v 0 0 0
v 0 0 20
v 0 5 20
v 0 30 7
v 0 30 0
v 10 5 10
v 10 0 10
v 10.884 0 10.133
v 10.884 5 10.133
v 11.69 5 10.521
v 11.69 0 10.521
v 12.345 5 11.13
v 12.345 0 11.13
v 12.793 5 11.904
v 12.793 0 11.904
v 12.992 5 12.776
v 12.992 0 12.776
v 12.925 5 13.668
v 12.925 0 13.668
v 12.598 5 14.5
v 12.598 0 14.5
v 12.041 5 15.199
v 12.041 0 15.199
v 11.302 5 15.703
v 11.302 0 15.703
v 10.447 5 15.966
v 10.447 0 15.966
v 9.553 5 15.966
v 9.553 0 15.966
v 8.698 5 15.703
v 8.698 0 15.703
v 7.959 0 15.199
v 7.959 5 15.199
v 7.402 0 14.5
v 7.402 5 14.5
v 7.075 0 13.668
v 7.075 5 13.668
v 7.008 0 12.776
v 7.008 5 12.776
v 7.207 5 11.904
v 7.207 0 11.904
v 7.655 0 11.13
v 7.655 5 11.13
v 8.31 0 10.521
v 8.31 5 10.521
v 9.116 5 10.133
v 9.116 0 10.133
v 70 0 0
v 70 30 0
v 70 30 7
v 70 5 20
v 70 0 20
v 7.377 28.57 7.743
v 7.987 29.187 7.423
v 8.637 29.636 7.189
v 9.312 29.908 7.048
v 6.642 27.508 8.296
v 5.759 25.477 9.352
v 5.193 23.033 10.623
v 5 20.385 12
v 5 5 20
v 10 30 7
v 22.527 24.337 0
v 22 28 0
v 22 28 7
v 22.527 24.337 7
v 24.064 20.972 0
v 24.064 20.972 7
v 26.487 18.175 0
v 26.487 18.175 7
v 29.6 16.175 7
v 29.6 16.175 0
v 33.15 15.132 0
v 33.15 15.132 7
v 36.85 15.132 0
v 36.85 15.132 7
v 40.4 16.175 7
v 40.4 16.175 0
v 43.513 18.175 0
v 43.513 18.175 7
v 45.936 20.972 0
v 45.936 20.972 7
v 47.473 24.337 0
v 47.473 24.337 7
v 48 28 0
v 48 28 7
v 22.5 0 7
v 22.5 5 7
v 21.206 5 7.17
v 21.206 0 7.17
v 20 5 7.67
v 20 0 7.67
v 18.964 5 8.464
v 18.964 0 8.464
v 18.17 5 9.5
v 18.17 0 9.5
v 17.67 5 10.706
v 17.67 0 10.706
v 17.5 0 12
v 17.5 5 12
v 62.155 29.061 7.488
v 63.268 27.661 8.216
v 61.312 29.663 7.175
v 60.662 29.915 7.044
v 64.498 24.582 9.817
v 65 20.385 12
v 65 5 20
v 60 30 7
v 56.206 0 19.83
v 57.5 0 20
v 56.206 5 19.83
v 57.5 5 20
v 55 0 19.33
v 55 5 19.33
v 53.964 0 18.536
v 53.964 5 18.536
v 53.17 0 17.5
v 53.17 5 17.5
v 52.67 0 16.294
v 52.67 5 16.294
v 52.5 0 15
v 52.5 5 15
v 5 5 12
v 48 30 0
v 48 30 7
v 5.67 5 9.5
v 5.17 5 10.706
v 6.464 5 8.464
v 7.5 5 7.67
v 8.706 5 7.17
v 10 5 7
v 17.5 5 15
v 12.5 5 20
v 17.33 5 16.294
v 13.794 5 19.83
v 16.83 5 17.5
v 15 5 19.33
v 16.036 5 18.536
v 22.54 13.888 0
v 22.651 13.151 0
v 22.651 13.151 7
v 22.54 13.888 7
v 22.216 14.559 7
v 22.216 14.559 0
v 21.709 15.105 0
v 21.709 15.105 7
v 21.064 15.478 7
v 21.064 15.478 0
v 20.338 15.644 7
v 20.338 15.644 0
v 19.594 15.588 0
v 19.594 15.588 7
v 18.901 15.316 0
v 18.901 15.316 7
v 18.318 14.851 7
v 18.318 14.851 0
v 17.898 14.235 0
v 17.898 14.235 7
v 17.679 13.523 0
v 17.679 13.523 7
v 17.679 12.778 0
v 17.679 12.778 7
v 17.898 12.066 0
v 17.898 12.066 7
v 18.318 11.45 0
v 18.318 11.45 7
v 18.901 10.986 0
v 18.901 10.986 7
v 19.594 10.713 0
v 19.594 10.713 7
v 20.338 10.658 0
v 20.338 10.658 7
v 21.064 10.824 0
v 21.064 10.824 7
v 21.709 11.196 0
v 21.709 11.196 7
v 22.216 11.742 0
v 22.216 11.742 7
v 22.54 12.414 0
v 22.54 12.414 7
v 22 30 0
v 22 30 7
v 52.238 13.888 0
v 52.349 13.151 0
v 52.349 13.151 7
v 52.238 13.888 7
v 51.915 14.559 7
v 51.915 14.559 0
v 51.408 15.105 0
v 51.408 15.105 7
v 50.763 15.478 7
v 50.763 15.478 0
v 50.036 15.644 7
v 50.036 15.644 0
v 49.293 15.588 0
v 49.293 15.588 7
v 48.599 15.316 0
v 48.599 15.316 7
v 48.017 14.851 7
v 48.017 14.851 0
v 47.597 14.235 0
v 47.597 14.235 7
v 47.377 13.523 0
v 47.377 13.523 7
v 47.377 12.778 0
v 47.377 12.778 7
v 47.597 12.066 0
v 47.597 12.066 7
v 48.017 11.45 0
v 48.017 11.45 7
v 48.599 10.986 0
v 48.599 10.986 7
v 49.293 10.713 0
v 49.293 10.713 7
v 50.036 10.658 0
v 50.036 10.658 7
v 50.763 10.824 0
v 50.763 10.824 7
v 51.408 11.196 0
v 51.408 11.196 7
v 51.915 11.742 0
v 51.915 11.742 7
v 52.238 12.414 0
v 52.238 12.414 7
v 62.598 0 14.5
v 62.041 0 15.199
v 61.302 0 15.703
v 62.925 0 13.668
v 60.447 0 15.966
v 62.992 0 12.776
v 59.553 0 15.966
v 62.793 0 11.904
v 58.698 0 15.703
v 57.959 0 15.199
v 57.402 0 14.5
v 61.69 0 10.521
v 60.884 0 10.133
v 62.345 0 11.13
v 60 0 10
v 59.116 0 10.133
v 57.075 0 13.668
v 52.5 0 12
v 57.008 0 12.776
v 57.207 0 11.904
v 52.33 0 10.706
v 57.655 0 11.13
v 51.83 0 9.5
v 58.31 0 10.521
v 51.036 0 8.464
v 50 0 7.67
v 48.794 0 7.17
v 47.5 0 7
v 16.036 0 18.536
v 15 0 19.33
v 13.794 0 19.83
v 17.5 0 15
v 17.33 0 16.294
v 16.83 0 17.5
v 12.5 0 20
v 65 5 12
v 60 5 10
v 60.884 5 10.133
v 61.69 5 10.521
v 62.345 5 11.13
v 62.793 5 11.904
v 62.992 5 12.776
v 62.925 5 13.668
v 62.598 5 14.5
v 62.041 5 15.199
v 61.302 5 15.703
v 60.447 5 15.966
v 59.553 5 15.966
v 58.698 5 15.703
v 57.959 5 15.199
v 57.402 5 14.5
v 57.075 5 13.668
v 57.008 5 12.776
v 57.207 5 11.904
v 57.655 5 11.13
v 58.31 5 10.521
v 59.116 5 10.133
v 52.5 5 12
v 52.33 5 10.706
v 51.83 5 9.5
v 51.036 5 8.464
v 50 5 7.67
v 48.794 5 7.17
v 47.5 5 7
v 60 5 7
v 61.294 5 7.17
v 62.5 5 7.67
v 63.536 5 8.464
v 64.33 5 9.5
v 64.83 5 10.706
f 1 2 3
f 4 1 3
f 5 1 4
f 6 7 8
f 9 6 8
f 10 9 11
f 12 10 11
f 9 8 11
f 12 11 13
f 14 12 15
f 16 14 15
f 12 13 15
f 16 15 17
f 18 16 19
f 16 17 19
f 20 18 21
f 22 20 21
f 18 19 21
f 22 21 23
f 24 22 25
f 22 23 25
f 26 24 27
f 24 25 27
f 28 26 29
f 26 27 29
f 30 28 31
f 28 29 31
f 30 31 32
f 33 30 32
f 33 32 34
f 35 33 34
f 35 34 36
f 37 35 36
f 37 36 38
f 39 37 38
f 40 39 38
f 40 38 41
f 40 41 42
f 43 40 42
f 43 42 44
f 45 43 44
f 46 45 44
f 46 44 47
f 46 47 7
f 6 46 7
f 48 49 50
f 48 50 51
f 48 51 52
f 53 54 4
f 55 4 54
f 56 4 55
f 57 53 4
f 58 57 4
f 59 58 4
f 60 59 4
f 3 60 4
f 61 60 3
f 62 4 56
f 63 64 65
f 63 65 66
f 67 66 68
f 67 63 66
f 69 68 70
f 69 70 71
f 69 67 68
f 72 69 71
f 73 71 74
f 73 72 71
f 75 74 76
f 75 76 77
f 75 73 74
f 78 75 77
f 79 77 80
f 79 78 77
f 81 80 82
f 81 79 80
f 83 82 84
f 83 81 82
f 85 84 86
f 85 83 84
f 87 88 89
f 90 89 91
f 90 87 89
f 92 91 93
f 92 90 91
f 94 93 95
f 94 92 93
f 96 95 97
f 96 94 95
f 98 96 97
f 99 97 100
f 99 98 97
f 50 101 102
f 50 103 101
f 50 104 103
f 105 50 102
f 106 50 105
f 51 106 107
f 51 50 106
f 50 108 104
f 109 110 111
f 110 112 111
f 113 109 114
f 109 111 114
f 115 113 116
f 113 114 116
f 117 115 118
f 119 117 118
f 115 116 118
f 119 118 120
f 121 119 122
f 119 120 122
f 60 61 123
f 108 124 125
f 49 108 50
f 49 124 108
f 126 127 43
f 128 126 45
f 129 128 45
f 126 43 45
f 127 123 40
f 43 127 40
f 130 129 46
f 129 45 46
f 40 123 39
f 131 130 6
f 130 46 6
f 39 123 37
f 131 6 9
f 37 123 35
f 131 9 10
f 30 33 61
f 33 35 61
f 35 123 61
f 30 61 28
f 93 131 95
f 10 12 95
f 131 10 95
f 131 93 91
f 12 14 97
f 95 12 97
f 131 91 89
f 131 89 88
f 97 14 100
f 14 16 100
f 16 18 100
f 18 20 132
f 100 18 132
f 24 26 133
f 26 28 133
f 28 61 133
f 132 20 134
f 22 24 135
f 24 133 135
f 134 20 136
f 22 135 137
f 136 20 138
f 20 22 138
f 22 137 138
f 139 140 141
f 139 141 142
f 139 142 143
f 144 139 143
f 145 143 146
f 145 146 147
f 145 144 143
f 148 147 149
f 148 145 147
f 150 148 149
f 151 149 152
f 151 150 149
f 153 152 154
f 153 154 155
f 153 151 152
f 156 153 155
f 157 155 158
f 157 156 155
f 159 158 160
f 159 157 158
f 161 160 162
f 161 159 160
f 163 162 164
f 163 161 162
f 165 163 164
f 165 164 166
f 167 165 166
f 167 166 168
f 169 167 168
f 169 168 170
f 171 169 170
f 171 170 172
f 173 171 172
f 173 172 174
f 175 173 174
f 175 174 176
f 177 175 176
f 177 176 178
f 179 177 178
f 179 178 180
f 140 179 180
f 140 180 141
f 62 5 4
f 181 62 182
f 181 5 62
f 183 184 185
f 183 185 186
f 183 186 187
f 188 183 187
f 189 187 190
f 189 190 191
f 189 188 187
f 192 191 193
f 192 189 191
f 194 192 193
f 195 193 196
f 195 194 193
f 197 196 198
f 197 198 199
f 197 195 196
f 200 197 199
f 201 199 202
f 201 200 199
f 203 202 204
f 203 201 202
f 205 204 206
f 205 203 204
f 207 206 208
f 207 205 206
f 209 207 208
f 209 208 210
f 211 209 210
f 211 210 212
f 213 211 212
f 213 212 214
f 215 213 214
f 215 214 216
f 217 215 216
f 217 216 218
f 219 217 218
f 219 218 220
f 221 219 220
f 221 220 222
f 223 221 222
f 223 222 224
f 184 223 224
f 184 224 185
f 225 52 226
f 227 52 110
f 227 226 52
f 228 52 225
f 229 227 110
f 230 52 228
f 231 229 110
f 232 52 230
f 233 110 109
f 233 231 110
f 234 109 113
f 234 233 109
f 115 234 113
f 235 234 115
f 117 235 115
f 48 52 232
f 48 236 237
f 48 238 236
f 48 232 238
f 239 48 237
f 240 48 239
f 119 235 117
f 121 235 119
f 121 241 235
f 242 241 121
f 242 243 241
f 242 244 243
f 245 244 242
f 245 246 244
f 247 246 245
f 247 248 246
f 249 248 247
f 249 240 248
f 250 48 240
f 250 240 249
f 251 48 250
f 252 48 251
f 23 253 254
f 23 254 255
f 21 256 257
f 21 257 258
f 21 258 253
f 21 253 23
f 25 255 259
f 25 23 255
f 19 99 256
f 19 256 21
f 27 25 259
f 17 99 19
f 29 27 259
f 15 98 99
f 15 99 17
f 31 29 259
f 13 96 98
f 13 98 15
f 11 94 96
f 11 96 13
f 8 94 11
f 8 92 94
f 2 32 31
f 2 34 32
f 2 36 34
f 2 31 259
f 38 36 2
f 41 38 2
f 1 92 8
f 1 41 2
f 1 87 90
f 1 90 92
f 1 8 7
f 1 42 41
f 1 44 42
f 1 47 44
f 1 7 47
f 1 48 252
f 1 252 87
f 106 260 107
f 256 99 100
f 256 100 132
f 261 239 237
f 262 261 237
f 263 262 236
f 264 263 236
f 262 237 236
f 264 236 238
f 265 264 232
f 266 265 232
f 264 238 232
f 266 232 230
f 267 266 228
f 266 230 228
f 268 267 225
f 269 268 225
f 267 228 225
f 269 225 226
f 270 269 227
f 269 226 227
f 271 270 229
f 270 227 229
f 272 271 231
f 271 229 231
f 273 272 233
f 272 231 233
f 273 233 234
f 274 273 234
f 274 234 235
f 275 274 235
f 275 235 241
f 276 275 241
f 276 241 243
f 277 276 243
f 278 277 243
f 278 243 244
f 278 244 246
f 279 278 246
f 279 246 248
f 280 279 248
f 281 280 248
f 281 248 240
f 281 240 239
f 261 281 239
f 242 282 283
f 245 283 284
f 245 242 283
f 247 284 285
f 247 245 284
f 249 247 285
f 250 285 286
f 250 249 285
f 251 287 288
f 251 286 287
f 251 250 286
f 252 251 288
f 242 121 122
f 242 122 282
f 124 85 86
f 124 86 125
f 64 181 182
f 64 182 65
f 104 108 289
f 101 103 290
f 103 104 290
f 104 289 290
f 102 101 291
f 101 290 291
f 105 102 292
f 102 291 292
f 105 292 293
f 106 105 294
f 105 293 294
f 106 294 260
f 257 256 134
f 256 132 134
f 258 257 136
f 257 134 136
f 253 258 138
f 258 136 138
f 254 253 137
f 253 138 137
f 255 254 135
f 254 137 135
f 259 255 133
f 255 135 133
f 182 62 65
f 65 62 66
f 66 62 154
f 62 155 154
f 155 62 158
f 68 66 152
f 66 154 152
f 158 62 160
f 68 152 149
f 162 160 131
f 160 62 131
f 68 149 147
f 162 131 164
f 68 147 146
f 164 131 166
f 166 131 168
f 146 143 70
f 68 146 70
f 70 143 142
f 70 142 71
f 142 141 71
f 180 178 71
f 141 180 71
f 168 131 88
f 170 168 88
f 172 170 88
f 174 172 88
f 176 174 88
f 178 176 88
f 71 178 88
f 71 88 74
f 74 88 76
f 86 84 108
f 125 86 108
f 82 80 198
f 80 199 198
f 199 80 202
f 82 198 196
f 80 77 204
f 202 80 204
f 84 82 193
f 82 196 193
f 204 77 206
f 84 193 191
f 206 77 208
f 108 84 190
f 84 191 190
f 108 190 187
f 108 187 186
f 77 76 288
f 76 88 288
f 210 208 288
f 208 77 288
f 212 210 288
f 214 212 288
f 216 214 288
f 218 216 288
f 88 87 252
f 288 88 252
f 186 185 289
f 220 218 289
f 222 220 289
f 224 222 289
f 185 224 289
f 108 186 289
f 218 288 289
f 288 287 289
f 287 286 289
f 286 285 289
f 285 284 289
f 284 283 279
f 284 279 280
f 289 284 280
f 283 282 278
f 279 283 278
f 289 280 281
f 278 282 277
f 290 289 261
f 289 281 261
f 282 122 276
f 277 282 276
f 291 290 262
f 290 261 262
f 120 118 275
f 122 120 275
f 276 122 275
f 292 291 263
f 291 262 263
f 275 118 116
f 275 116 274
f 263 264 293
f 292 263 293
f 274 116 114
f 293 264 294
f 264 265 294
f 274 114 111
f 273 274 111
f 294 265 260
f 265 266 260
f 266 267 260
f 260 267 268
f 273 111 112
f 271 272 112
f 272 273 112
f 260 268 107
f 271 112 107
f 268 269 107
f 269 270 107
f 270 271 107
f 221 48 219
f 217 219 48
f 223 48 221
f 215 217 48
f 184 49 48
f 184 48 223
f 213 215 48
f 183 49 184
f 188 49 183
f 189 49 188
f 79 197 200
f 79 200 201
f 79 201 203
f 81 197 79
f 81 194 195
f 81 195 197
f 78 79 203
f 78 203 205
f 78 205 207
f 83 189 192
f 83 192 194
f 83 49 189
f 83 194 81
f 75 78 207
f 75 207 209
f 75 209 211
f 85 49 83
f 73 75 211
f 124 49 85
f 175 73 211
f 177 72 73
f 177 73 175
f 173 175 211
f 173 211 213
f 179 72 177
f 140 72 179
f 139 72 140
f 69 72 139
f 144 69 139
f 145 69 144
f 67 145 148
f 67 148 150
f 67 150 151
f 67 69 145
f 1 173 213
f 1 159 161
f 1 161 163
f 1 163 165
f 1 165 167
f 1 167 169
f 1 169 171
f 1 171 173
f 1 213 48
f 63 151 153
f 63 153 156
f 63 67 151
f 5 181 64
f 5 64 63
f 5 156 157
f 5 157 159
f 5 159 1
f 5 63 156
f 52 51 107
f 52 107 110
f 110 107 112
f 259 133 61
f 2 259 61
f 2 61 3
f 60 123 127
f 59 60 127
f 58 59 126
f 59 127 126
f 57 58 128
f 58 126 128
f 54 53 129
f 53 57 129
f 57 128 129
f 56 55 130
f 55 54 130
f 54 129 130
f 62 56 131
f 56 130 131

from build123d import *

# Parameters (mm, degrees)
SKETCH1_R           = 2.5
BOSS_EXTRUDE1_DEPTH = 20
CUT_EXTRUDE1_DEPTH  = 71
SKETCH3_R           = 3
CUT_EXTRUDE2_DEPTH  = 31
CUT_EXTRUDE3_START  = -5
CUT_EXTRUDE3_DEPTH  = 26
FILLET1_R           = 5


with BuildPart() as part:
    # Sketch1 → Boss-Extrude1 (new body)
    with BuildSketch(Plane.XY):
        with BuildLine():
            Line((0, 0), (0, 5))
            Line((0, 5), (0, 30))
            Line((0, 30), (22, 30))
            Line((22, 30), (22, 28))
            ThreePointArc((22, 28), (35, 15), (48, 28))
            Line((48, 28), (48, 30))
            Line((48, 30), (70, 30))
            Line((70, 30), (70, 5))
            Line((70, 5), (70, 0))
            Line((70, 0), (0, 0))
        make_face()
        with Locations((20.150757595, 13.150757595)):
            Circle(SKETCH1_R, mode=Mode.SUBTRACT)
        with Locations((49.849242405, 13.150757595)):
            Circle(SKETCH1_R, mode=Mode.SUBTRACT)
    extrude(amount=BOSS_EXTRUDE1_DEPTH)

    # Sketch2 → Cut-Extrude1 (cut, through all)
    with BuildSketch(Plane(origin=(70, 0, 0), x_dir=(0, 0, -1), z_dir=(1, 0, 0))):
        Polygon((-7, 30), (-20, 5), (-20, 30), align=None)
    extrude(amount=-CUT_EXTRUDE1_DEPTH, mode=Mode.SUBTRACT)

    # Sketch3 → Cut-Extrude2 (cut, through all)
    with BuildSketch(Plane.XZ):
        with Locations(Location((10, 13, 0), (0, 0, 270))):  # turned: the seam where the file's is
            Circle(SKETCH3_R)
        with Locations(Location((60, 13, 0), (0, 0, 270))):  # turned: the seam where the file's is
            Circle(SKETCH3_R)
        with BuildLine():
            Line((17.5, 20), (52.5, 20))
            Line((52.5, 20), (52.5, 12))
            ThreePointArc((52.5, 12), (51.035533906, 8.464466094), (47.5, 7))
            Line((47.5, 7), (22.5, 7))
            ThreePointArc((22.5, 7), (18.964466094, 8.464466094), (17.5, 12))
            Line((17.5, 12), (17.5, 20))
        make_face()
    extrude(amount=-CUT_EXTRUDE2_DEPTH, mode=Mode.SUBTRACT)

    # Sketch4 → Cut-Extrude3 (cut, through all)
    with BuildSketch(Plane.XZ.offset(CUT_EXTRUDE3_START)):
        with BuildLine():
            Line((65, 12), (65, 20))
            Line((65, 20), (5, 20))
            Line((5, 20), (5, 12))
            ThreePointArc((5, 12), (6.464466094, 8.464466094), (10, 7))
            Line((10, 7), (60, 7))
            ThreePointArc((60, 7), (63.535533906, 8.464466094), (65, 12))
        make_face()
    extrude(amount=-CUT_EXTRUDE3_DEPTH, mode=Mode.SUBTRACT)

    # Fillet1
    fillet1_edges = [part.edges().sort_by_distance(p)[0] for p in [
        (17.5, 2.5, 20),
        (52.5, 2.5, 20),
    ]]
    fillet(fillet1_edges, radius=FILLET1_R)


solid = part.part
